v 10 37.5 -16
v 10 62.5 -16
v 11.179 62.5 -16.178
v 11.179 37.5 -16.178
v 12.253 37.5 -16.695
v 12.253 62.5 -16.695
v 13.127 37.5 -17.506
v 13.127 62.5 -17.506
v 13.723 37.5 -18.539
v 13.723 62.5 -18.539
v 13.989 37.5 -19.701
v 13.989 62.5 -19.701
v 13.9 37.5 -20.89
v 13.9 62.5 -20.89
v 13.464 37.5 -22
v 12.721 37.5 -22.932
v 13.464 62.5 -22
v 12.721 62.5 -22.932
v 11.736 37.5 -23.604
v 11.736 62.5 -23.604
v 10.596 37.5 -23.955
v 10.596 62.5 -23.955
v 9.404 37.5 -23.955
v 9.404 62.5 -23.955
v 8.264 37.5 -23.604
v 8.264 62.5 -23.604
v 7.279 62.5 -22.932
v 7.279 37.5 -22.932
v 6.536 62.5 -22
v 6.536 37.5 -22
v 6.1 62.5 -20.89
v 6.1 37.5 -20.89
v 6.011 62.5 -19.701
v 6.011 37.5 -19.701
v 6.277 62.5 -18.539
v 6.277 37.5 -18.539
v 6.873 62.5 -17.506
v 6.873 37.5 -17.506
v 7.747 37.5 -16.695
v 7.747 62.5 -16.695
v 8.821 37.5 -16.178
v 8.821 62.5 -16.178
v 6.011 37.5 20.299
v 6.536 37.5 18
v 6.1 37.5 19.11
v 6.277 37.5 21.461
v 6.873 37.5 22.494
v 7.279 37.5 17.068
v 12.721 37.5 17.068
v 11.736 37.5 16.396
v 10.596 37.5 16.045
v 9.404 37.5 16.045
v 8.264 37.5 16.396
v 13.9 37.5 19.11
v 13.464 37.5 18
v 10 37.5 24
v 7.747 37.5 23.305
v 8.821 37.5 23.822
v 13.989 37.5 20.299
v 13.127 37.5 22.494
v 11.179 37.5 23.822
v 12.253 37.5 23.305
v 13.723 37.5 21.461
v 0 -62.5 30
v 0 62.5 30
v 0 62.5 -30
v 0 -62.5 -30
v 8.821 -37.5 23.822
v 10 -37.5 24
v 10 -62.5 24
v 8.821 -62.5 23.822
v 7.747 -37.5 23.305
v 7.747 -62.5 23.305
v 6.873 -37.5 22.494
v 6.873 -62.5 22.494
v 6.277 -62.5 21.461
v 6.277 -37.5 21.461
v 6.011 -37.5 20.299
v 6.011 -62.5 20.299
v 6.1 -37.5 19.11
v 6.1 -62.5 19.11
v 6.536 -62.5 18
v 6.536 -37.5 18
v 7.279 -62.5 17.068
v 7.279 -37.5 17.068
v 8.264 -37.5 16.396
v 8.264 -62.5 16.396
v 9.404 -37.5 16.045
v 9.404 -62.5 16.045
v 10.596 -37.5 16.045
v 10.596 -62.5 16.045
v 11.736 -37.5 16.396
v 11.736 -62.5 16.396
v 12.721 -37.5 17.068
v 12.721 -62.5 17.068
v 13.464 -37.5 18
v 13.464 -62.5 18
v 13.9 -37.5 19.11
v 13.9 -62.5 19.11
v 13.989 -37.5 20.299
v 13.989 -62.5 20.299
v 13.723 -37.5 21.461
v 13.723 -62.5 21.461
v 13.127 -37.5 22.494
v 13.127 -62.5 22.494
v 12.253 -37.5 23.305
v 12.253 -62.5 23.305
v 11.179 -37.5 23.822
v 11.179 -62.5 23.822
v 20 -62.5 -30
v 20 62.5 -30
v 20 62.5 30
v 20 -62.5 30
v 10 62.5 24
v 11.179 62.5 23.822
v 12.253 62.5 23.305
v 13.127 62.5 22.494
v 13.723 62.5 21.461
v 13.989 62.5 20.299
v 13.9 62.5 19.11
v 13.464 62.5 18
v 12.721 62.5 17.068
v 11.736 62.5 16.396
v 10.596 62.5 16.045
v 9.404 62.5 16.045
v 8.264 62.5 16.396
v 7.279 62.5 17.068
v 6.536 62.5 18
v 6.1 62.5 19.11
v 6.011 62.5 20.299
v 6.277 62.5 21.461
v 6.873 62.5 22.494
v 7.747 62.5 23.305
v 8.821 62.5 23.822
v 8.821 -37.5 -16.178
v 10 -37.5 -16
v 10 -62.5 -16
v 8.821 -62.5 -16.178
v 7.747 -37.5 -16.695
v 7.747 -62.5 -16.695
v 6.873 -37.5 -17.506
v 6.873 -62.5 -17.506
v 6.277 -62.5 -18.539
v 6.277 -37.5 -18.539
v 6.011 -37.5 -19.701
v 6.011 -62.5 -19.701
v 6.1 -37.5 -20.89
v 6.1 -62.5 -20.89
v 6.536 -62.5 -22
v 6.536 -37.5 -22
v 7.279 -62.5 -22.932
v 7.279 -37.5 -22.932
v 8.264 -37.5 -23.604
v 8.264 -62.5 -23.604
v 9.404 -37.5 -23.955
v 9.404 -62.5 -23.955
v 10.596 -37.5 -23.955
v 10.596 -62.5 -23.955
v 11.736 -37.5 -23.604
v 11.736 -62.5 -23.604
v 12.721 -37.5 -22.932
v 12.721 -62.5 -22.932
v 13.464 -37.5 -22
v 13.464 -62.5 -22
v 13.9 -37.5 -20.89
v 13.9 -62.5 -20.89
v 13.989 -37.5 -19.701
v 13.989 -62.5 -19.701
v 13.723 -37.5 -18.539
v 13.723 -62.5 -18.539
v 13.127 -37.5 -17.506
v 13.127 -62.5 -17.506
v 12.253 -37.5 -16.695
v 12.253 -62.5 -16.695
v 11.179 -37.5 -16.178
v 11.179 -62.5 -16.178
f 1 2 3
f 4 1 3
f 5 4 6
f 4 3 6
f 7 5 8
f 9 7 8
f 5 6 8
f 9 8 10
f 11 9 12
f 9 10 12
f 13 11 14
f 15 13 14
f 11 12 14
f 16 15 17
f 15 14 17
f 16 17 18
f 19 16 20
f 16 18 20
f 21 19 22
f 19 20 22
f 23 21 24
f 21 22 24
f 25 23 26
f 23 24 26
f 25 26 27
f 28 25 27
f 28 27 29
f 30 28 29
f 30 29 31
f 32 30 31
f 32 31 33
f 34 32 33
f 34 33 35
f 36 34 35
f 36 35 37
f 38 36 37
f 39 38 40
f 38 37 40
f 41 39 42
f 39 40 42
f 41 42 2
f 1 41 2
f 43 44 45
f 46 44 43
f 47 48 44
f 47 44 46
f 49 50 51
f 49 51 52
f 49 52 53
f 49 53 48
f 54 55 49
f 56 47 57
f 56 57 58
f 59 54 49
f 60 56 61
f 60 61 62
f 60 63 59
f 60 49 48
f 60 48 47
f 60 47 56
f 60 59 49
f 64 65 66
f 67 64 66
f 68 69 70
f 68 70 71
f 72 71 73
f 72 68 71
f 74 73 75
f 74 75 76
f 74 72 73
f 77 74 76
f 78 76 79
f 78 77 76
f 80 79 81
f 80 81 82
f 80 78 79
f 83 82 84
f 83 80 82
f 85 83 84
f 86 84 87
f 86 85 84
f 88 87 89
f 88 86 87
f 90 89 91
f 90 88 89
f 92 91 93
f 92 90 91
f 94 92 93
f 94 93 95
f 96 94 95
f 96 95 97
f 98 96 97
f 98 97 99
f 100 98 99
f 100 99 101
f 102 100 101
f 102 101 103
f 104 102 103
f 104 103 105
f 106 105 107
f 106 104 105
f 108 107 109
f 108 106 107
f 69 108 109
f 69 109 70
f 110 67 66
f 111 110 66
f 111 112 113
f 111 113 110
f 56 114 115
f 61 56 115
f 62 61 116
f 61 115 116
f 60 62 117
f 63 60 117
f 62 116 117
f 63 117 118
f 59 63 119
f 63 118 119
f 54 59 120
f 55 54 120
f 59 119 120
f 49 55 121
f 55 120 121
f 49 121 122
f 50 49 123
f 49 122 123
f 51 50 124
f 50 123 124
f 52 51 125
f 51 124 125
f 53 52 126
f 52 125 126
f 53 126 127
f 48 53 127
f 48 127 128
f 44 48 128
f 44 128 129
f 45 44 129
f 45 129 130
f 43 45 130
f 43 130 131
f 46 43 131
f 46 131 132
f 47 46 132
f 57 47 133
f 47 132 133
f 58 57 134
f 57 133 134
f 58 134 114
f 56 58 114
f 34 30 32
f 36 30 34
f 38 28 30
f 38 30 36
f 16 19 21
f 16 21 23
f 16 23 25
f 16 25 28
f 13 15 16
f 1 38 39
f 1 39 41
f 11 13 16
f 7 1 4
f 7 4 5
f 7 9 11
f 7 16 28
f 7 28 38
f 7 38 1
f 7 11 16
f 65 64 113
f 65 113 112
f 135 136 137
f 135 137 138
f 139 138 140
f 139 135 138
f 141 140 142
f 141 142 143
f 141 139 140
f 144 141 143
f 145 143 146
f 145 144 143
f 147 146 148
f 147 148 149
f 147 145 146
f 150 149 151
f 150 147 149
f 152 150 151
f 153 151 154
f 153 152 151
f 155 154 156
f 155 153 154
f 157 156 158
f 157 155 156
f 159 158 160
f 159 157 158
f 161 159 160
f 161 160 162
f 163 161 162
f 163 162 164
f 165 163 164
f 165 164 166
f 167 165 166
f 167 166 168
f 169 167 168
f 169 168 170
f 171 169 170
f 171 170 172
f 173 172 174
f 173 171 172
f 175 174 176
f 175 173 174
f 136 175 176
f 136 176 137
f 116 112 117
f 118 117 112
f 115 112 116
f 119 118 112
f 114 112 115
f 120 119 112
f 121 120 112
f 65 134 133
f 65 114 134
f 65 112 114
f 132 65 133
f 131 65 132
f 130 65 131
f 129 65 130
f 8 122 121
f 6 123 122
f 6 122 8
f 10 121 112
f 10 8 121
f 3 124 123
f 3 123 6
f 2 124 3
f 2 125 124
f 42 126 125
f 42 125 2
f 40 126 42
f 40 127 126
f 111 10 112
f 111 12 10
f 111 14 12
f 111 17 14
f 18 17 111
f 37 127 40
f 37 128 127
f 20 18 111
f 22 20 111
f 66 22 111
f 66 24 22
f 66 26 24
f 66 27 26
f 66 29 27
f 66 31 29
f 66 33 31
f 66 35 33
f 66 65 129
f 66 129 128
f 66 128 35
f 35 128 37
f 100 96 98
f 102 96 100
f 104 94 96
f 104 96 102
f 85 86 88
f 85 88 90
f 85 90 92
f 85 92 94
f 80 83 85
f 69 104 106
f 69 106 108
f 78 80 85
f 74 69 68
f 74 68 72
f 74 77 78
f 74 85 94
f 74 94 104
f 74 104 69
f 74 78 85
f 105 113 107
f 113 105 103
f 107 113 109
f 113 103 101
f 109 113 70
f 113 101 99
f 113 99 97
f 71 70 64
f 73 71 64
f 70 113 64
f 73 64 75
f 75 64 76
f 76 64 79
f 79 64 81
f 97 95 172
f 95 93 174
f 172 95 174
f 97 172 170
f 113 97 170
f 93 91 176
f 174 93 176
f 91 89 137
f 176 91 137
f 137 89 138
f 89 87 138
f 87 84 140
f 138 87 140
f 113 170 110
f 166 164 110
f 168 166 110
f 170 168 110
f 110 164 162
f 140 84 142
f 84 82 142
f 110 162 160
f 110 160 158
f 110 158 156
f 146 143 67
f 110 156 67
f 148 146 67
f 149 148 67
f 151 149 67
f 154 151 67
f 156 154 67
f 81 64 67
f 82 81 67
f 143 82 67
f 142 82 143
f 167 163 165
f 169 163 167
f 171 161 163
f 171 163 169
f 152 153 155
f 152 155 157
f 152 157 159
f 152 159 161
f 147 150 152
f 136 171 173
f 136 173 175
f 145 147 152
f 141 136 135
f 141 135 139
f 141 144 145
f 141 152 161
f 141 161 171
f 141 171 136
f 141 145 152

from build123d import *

# Parameters (mm, degrees)
CROQUIS1_W              = 60
CROQUIS1_H              = 125
SALIENTE_EXTRUIR1_DEPTH = 20
CROQUIS2_R              = 4
CORTAR_EXTRUIR1_DEPTH   = 25
CORTAR_EXTRUIR2_START   = -25
CROQUIS3_R              = 4
CORTAR_EXTRUIR2_DEPTH   = 25


with BuildPart() as part:
    # Croquis1 → Saliente-Extruir1 (new body)
    with BuildSketch(Plane(origin=(0, 0, 0), x_dir=(0, 0, -1), z_dir=(1, 0, 0))):
        Rectangle(CROQUIS1_W, CROQUIS1_H)
    extrude(amount=SALIENTE_EXTRUIR1_DEPTH)

    # Croquis2 → Cortar-Extruir1 (cut)
    with BuildSketch(Plane(origin=(0, 62.5, 0), x_dir=(1, 0, 0), z_dir=(0, 1, 0))):
        with Locations(Location((10, 20, 0), (0, 0, 270))):
            Circle(CROQUIS2_R)
        with Locations(Location((10, -20, 0), (0, 0, 270))):
            Circle(CROQUIS2_R)
    extrude(amount=-CORTAR_EXTRUIR1_DEPTH, mode=Mode.SUBTRACT)

    # Croquis3 → Cortar-Extruir2 (cut)
    with BuildSketch(Plane.XZ.offset(62.5).offset(CORTAR_EXTRUIR2_START)):
        with Locations(Location((10, 20, 0), (0, 0, 90))):
            Circle(CROQUIS3_R)
        with Locations(Location((10, -20, 0), (0, 0, 90))):
            Circle(CROQUIS3_R)
    extrude(amount=CORTAR_EXTRUIR2_DEPTH, mode=Mode.SUBTRACT)


solid = part.part
